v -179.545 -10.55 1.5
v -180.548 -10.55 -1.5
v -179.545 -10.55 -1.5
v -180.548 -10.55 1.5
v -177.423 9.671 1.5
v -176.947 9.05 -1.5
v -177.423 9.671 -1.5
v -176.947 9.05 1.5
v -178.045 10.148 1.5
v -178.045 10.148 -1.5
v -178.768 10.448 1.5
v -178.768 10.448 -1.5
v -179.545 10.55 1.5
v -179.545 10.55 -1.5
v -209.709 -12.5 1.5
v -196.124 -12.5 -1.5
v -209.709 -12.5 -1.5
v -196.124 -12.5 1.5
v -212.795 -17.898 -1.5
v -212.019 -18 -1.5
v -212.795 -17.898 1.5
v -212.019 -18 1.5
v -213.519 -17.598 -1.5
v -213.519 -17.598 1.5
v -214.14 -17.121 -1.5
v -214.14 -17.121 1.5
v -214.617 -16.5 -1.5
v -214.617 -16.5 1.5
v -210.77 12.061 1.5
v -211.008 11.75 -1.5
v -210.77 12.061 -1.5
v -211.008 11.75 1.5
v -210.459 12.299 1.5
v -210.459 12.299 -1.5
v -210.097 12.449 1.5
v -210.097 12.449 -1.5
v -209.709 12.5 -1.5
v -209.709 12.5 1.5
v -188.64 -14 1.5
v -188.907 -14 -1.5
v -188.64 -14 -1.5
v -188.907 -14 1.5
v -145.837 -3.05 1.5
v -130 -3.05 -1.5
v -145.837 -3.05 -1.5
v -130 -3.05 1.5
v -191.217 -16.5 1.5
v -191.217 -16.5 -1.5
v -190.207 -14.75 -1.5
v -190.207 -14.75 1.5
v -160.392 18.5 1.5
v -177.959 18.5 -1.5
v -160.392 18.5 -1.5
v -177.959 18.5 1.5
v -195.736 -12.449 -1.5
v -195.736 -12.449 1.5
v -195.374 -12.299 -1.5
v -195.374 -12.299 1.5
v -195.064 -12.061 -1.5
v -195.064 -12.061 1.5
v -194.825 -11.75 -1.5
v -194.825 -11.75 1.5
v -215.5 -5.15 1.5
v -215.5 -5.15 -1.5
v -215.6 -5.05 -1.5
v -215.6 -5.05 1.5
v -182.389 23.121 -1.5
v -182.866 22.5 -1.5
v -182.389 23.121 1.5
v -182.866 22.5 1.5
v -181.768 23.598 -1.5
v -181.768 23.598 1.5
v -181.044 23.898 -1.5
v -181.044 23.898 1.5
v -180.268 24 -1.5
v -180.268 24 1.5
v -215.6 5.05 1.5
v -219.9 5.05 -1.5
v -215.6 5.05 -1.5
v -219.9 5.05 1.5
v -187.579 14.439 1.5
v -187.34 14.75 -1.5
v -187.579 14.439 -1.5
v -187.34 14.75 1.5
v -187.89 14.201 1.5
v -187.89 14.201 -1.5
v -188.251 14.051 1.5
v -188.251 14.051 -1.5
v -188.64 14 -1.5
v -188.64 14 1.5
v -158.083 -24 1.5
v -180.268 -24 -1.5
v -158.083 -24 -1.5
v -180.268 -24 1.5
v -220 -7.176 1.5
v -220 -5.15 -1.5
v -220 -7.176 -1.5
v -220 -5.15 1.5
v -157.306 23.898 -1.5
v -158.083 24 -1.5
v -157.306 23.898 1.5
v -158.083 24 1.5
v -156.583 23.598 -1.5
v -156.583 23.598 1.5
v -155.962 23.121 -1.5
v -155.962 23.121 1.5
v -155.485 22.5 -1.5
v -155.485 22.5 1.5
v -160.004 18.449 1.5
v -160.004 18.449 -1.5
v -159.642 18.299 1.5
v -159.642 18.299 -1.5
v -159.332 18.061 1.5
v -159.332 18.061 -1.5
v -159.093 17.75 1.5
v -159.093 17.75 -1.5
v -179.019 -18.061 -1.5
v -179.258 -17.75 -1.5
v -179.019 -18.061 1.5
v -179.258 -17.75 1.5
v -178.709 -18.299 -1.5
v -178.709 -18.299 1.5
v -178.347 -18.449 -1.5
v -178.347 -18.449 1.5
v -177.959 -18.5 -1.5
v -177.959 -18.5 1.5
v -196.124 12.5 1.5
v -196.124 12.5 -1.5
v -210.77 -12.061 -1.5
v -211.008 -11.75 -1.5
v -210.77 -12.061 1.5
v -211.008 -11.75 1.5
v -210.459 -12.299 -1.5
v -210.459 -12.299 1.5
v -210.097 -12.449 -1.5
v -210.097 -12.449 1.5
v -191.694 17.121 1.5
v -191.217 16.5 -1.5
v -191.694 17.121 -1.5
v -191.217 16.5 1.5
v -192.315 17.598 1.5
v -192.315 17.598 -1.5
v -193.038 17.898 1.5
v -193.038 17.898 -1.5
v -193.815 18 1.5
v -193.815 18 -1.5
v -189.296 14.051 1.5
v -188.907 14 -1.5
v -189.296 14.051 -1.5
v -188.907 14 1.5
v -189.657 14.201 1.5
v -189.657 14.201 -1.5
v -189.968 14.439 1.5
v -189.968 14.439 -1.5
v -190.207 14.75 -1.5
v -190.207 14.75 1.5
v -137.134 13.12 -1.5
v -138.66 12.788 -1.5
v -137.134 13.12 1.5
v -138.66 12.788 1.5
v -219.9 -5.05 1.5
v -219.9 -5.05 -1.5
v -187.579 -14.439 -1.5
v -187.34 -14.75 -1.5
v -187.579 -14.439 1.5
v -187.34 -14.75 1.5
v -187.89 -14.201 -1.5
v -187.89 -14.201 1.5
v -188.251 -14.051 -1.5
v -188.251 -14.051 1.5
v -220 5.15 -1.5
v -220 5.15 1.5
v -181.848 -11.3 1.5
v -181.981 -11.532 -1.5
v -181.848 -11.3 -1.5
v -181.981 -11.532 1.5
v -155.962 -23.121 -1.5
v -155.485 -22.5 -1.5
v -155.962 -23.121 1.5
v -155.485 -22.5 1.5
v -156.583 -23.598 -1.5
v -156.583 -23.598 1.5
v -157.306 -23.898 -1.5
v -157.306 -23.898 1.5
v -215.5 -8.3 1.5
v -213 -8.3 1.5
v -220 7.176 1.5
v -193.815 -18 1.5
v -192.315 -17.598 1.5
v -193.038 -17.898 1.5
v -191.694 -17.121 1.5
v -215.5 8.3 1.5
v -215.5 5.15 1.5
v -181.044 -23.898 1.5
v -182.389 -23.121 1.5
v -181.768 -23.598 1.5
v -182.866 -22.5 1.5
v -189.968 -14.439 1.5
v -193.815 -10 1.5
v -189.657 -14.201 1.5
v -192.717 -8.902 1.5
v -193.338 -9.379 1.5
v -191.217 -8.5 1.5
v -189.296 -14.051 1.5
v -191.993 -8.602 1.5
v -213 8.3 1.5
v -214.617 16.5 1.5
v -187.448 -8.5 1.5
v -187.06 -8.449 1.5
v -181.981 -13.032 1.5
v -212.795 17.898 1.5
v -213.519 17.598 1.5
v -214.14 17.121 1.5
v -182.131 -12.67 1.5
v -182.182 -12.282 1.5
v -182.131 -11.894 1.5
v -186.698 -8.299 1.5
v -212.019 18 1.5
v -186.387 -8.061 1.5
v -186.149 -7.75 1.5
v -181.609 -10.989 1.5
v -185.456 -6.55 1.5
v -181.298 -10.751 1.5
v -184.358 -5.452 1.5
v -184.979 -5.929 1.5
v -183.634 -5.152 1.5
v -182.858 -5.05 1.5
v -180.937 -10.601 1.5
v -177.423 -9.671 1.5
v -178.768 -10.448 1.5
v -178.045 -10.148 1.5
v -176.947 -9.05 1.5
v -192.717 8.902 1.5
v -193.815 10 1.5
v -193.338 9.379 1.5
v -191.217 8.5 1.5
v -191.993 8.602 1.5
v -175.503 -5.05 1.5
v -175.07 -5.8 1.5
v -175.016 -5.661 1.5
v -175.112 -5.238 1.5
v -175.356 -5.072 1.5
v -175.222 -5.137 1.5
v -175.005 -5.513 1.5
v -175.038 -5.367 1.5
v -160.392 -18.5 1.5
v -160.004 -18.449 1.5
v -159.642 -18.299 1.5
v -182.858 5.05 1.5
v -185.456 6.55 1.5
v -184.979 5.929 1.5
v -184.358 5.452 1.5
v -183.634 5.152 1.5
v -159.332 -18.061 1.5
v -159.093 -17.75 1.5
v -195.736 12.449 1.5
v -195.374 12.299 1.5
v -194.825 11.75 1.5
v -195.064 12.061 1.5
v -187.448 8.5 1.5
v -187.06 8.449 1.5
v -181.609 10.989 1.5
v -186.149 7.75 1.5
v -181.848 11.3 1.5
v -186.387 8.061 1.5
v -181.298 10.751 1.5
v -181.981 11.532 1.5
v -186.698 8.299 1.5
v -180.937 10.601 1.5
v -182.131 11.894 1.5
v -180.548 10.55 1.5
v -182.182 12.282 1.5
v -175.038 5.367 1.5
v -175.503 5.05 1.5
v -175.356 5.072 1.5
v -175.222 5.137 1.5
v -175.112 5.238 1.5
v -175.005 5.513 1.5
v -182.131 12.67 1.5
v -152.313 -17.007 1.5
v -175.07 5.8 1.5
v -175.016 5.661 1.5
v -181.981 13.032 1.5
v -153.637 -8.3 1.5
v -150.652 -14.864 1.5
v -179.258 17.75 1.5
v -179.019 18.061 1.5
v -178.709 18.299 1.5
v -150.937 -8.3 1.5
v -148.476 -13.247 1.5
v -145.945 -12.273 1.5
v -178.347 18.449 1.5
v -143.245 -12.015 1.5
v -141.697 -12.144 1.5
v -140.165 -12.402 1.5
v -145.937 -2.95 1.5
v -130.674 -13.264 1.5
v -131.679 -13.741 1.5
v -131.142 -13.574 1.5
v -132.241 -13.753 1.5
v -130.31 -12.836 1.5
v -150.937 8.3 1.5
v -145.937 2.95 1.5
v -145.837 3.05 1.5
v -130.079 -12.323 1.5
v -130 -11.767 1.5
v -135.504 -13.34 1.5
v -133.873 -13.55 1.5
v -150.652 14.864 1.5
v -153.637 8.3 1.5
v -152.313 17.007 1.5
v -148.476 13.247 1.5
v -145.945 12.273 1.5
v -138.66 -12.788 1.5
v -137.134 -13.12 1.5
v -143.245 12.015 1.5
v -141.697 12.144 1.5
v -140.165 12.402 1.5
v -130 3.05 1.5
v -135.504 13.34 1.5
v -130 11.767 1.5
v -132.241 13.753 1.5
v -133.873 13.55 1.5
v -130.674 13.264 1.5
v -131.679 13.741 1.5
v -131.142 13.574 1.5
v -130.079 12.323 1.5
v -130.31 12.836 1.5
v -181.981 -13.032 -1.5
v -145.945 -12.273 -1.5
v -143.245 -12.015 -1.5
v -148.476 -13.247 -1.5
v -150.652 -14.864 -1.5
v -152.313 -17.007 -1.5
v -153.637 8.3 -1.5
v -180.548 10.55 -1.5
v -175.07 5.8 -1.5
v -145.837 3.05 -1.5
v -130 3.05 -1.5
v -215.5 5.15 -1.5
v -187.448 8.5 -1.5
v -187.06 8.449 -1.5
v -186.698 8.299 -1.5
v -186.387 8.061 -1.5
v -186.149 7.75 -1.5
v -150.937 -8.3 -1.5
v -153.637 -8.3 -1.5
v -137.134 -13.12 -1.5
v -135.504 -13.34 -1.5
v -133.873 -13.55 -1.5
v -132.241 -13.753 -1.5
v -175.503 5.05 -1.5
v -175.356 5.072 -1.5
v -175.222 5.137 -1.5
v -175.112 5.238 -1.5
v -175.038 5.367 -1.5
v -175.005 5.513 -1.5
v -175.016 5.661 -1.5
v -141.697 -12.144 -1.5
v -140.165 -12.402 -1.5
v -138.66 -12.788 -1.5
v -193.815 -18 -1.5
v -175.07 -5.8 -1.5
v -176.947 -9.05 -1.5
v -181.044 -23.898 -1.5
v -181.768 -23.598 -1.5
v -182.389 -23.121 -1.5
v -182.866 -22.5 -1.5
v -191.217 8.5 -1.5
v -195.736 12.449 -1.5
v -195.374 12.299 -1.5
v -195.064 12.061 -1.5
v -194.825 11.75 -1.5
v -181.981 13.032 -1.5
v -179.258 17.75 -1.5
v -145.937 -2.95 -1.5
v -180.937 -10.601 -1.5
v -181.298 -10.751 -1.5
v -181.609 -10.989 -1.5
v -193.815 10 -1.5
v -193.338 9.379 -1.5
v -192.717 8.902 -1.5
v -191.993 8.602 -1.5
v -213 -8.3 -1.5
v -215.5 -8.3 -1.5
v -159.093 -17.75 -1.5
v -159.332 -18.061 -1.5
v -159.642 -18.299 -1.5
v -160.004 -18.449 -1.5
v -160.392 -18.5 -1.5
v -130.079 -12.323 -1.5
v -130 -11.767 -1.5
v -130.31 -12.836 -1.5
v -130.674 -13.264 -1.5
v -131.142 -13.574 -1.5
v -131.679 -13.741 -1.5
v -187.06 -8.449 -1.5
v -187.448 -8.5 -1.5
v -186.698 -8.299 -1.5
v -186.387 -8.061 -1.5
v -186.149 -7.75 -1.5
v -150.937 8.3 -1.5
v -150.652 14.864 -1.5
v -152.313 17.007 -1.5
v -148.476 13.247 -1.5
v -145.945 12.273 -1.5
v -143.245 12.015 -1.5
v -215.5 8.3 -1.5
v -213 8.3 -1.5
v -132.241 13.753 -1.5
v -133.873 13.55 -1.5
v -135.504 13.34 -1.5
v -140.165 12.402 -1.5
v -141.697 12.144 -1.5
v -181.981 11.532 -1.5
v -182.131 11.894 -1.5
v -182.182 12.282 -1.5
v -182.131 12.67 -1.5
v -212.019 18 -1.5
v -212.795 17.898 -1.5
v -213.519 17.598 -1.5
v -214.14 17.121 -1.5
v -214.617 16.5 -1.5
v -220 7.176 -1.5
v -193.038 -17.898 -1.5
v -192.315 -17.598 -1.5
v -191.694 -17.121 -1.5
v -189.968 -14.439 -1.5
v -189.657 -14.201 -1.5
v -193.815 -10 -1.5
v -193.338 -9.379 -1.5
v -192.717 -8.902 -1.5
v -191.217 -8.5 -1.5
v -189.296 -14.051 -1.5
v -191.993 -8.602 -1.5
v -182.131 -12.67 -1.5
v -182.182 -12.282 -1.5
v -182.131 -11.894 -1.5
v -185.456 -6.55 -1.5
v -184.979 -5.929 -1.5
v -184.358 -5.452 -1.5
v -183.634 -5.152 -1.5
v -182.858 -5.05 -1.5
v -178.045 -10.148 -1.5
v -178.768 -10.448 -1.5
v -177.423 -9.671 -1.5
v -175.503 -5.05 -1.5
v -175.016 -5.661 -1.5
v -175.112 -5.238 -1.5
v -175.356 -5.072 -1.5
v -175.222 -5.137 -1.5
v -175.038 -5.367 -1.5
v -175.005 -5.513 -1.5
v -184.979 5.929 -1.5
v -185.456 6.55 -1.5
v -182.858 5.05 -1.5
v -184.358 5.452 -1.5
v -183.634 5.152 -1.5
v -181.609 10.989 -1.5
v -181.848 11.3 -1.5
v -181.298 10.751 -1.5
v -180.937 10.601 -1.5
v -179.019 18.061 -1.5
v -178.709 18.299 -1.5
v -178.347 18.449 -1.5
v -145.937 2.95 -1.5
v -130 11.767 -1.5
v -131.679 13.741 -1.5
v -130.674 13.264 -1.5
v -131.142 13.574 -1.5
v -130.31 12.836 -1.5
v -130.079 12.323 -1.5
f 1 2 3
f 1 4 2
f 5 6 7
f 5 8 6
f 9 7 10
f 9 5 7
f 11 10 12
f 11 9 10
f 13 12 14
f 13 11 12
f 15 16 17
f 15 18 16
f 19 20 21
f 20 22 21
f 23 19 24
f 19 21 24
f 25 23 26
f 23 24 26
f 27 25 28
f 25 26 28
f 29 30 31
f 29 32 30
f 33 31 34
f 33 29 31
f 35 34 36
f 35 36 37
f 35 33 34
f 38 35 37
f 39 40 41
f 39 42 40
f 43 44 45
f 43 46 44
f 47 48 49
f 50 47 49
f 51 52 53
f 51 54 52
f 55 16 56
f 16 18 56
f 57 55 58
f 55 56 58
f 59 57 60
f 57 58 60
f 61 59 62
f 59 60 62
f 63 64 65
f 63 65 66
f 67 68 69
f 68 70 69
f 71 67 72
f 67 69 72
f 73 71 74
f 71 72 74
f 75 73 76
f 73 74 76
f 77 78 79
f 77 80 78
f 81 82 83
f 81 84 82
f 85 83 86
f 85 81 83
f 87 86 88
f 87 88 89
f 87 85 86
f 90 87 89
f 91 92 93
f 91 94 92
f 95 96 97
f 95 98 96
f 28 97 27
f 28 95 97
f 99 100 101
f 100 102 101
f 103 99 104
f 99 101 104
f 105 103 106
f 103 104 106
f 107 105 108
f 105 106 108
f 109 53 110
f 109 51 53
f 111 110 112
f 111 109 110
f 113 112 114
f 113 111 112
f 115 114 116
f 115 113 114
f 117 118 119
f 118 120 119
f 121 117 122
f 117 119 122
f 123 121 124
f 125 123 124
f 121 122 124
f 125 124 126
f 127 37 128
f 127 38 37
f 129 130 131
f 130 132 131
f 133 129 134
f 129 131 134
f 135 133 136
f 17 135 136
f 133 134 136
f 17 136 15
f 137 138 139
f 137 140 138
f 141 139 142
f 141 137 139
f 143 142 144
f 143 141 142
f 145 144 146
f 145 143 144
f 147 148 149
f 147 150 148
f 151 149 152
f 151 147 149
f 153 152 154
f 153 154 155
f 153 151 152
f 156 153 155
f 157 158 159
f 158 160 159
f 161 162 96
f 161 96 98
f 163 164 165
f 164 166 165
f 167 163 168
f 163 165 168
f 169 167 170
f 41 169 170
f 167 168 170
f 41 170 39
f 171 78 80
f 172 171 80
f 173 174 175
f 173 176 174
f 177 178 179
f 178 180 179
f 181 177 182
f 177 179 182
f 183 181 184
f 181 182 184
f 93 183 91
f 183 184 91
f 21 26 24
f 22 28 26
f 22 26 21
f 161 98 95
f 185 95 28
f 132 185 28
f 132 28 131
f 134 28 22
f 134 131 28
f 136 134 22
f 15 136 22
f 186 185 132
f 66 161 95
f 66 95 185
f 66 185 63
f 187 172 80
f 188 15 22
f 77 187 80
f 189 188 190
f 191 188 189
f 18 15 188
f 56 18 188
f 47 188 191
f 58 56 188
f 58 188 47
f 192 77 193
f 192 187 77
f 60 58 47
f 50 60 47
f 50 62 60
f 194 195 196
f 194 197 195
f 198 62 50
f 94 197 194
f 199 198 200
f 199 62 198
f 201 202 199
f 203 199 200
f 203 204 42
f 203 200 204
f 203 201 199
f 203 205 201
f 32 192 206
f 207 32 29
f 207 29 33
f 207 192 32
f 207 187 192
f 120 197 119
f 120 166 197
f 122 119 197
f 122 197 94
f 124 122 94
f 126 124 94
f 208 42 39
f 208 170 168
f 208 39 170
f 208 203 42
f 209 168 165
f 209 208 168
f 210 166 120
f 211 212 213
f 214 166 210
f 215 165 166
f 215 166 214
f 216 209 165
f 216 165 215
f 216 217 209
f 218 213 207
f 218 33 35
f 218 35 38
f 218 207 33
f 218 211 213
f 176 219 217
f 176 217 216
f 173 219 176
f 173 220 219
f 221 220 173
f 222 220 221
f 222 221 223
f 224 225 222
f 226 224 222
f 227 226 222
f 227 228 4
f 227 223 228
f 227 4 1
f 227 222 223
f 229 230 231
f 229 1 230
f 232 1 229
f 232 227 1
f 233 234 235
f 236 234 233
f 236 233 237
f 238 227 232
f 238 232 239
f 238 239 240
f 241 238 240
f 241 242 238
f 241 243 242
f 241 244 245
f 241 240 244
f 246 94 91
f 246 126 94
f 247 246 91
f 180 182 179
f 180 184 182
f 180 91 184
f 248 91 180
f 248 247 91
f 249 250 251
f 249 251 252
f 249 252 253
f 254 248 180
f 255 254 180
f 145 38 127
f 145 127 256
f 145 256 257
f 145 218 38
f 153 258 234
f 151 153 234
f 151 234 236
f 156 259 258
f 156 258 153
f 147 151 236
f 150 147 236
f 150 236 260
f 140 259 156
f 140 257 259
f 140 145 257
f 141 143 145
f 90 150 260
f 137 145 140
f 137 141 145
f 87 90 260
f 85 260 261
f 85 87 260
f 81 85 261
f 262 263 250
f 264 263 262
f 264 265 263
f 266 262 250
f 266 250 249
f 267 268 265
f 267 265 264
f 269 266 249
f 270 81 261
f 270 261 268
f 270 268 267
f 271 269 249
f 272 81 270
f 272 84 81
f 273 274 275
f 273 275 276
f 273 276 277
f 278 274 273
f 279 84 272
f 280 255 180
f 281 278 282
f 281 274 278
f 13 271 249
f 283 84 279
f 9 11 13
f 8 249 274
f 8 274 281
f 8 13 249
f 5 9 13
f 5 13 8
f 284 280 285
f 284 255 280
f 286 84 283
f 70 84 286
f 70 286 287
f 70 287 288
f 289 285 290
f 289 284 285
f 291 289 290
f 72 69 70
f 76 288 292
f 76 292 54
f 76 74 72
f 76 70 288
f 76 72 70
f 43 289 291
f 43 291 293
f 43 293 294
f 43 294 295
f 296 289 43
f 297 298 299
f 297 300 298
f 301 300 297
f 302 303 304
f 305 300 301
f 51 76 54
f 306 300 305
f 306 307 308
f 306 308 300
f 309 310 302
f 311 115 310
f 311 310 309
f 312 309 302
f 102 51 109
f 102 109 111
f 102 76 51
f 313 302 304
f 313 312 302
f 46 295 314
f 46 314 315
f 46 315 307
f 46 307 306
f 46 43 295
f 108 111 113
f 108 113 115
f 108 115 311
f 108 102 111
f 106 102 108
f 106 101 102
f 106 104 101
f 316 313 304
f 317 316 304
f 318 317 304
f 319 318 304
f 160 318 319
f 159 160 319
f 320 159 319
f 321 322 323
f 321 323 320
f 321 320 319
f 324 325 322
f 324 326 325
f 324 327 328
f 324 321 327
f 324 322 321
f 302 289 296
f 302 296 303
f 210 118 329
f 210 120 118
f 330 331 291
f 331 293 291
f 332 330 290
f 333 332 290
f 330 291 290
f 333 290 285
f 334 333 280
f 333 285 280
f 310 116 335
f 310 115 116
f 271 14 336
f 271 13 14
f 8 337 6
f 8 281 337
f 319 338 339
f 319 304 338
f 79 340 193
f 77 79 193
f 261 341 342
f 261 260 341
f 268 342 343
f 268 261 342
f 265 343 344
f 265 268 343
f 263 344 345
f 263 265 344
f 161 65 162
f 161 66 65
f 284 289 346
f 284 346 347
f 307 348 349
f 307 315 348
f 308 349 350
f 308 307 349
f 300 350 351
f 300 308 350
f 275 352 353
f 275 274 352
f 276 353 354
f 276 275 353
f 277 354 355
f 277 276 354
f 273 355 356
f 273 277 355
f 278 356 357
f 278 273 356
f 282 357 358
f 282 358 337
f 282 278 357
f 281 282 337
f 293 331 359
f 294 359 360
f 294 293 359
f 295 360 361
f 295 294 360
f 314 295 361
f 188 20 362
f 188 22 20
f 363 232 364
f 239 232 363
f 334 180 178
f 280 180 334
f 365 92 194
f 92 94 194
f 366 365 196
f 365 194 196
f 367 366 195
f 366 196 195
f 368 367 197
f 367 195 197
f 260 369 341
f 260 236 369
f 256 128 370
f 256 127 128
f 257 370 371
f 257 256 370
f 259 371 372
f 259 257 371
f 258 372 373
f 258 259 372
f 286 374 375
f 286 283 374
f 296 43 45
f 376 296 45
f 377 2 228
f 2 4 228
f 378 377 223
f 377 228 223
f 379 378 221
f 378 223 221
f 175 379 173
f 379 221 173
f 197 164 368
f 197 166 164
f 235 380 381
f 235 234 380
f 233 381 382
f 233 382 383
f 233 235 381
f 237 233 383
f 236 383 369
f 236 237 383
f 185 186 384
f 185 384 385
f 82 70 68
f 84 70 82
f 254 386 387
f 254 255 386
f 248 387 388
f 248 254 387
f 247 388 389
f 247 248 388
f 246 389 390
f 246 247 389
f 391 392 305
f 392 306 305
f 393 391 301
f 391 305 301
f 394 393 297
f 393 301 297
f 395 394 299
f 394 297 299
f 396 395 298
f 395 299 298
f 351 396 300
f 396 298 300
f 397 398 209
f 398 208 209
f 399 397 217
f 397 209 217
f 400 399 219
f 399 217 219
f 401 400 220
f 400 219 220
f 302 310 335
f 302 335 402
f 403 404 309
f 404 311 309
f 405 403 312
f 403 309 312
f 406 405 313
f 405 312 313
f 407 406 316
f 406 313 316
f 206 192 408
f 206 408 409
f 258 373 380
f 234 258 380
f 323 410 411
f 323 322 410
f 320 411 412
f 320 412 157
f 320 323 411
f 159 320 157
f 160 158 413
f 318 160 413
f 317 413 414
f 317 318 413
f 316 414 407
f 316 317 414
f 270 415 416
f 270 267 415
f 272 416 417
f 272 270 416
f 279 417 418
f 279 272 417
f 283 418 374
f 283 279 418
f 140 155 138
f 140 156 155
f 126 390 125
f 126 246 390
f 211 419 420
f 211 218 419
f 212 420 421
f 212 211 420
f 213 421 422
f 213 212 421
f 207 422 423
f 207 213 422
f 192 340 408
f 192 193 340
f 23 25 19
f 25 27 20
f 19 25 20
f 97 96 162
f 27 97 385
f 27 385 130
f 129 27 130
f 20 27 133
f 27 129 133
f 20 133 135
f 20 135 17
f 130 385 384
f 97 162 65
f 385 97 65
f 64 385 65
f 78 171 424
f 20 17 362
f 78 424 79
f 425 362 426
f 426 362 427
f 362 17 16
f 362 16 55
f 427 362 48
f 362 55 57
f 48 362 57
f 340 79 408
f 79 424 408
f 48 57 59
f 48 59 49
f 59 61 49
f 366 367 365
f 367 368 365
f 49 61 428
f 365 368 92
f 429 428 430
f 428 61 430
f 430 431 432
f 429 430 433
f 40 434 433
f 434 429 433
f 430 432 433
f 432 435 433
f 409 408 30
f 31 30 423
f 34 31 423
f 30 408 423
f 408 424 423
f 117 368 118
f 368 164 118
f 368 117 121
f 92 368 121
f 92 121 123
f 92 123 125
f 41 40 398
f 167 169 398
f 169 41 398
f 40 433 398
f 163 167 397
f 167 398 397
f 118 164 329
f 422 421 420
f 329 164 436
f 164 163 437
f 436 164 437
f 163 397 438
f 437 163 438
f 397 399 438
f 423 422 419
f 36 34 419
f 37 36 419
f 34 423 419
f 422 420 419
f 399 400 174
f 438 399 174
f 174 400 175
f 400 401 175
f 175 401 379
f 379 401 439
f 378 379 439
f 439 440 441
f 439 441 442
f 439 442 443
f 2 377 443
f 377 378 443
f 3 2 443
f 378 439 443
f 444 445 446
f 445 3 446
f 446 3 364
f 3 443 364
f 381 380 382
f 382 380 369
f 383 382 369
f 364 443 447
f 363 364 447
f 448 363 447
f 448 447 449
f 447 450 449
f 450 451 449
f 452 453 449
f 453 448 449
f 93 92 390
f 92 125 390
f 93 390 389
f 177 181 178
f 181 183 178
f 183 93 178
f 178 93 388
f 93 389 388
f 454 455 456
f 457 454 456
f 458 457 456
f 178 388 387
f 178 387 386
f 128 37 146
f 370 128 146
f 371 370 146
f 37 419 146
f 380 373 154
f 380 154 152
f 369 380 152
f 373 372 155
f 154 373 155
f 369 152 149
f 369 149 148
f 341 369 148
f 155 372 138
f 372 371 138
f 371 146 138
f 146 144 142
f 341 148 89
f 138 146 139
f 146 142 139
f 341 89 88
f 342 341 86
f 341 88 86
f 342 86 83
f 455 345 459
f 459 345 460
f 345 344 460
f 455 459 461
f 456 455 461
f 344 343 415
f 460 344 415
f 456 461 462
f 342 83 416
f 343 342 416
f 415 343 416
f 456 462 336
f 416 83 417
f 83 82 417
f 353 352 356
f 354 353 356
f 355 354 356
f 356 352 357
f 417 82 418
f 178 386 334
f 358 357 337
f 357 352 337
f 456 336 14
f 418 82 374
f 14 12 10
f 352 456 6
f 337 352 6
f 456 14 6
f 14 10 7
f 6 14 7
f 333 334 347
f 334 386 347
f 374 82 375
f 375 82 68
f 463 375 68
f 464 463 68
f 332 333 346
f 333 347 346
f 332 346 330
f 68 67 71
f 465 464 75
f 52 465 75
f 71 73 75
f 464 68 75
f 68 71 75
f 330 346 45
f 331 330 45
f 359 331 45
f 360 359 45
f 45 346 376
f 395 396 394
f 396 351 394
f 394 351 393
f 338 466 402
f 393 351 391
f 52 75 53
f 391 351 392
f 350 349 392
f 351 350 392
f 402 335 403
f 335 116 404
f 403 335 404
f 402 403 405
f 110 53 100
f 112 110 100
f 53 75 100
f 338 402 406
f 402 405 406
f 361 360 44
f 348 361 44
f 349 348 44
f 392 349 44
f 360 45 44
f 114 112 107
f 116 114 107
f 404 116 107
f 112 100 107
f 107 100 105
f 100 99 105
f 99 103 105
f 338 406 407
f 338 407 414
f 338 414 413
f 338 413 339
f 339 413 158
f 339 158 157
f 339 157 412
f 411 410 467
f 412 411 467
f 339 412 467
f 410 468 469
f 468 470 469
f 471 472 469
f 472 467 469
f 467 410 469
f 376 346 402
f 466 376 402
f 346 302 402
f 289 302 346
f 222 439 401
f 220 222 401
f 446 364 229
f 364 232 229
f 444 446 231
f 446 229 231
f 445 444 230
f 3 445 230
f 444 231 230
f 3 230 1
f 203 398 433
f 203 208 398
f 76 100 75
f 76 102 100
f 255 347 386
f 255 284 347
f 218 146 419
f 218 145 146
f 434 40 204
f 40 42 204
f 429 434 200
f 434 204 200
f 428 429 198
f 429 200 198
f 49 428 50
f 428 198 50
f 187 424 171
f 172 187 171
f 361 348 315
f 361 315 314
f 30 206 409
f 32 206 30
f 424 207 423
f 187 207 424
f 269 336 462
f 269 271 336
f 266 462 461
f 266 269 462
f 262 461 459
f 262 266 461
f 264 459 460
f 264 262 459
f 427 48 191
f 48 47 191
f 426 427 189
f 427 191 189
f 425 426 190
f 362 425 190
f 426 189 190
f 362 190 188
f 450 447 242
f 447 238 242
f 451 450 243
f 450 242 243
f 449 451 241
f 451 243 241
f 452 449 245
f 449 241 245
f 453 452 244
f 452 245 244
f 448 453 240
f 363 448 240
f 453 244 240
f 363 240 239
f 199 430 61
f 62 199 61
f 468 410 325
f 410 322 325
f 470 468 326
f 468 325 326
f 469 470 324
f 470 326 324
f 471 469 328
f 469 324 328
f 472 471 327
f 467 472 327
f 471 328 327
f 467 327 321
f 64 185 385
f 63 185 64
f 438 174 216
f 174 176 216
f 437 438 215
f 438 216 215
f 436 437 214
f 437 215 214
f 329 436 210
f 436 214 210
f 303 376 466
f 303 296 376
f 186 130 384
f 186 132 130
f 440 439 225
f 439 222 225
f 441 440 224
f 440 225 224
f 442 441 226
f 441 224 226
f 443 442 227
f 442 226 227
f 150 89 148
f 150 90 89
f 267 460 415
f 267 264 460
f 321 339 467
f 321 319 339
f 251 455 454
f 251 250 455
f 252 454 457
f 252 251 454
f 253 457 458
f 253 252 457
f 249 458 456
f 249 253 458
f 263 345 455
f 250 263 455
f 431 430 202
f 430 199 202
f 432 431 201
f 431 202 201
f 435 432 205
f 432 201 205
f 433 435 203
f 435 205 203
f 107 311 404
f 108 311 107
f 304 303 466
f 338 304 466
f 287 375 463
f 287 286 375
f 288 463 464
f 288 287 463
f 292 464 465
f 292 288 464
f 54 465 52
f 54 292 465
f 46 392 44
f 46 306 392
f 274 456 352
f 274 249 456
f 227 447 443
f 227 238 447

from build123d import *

# Parameters (mm, degrees)
EXTRUDE_1_DEPTH = 1.5
FILLET_4_R      = 10
FILLET_7_R      = 1.5
FILLET_8_R      = 3
CHAMFER_1_SIZE  = 0.1
FILLET_9_R      = 2
FILLET_10_R     = 0.5


with BuildPart() as part:
    # 草图1 → 凸台-拉伸1 (new, symmetric)
    with BuildSketch(Plane.XY):
        with BuildLine():
            Line((-130, 3.05), (-130, 14.015709242))
            ThreePointArc((-130, 14.015709242), (-134.003306479, 13.533897344), (-138, 13))
            ThreePointArc((-138, 13), (-144, 12.000000001), (-150, 13))
            Line((-150, 13), (-156.350852961, 24))
            Line((-156.350852961, 24), (-182, 24))
            Line((-182, 24), (-187.773502692, 14))
            Line((-187.773502692, 14), (-189.773502692, 14))
            Line((-189.773502692, 14), (-192.082903768, 18))
            Line((-192.082903768, 18), (-213.75055535, 18))
            Line((-213.75055535, 18), (-220, 7.175644347))
            Line((-220, 7.175644347), (-220, 5.05))
            Line((-220, 5.05), (-215.5, 5.05))
            Line((-215.5, 5.05), (-215.5, 8.3))
            Line((-215.5, 8.3), (-213, 8.3))
            Line((-213, 8.3), (-210.575128869, 12.5))
            Line((-210.575128869, 12.5), (-195.258330249, 12.5))
            Line((-195.258330249, 12.5), (-192.948929172, 8.5))
            Line((-192.948929172, 8.5), (-186.581793069, 8.5))
            Line((-186.581793069, 8.5), (-184.58993464, 5.05))
            Line((-184.58993464, 5.05), (-174.637306696, 5.05))
            Line((-174.637306696, 5.05), (-177.812733177, 10.55))
            Line((-177.812733177, 10.55), (-181.41450816, 10.55))
            Line((-181.41450816, 10.55), (-182.41450816, 12.282050807))
            Line((-182.41450816, 12.282050807), (-178.824573519, 18.5))
            Line((-178.824573519, 18.5), (-159.526279442, 18.5))
            Line((-159.526279442, 18.5), (-153.637306696, 8.3))
            Line((-153.637306696, 8.3), (-150.937306696, 8.3))
            Line((-150.937306696, 8.3), (-150.937306696, 3.05))
            Line((-150.937306696, 3.05), (-150.937306696, -3.05))
            Line((-150.937306696, -3.05), (-150.937306696, -8.3))
            Line((-150.937306696, -8.3), (-153.637306696, -8.3))
            Line((-153.637306696, -8.3), (-159.526279442, -18.5))
            Line((-159.526279442, -18.5), (-178.824573519, -18.5))
            Line((-178.824573519, -18.5), (-182.41450816, -12.282050807))
            Line((-182.41450816, -12.282050807), (-181.41450816, -10.55))
            Line((-181.41450816, -10.55), (-177.812733177, -10.55))
            Line((-177.812733177, -10.55), (-174.637306696, -5.05))
            Line((-174.637306696, -5.05), (-184.58993464, -5.05))
            Line((-184.58993464, -5.05), (-186.581793069, -8.5))
            Line((-186.581793069, -8.5), (-192.948929172, -8.5))
            Line((-192.948929172, -8.5), (-195.258330249, -12.5))
            Line((-195.258330249, -12.5), (-210.575128869, -12.5))
            Line((-210.575128869, -12.5), (-213, -8.3))
            Line((-213, -8.3), (-215.5, -8.3))
            Line((-215.5, -8.3), (-215.5, -5.05))
            Line((-215.5, -5.05), (-220, -5.05))
            Line((-220, -5.05), (-220, -7.175644347))
            Line((-220, -7.175644347), (-213.75055535, -18))
            Line((-213.75055535, -18), (-192.082903768, -18))
            Line((-192.082903768, -18), (-189.773502692, -14))
            Line((-189.773502692, -14), (-187.773502692, -14))
            Line((-187.773502692, -14), (-182, -24))
            Line((-182, -24), (-156.350852961, -24))
            Line((-156.350852961, -24), (-150, -13))
            ThreePointArc((-150, -13), (-144, -12), (-138, -13))
            ThreePointArc((-138, -13), (-134.003306479, -13.533897343), (-130, -14.015709241))
            Line((-130, -14.015709242), (-130, -3.05))
            Line((-130, -3.05), (-145.937306696, -3.05))
            Line((-145.937306696, -3.05), (-145.937306696, 3.05))
            Line((-145.937306696, 3.05), (-130, 3.05))
        make_face()
    extrude(amount=EXTRUDE_1_DEPTH, both=True)

    # 圆角4
    fillet_4_edges = [part.edges().sort_by_distance(p)[0] for p in [
        (-138, 13, 0),
        (-138, -13, 0),
        (-150, -13, 0),
        (-150, 13, 0),
    ]]
    fillet(fillet_4_edges, radius=FILLET_4_R)

    # 圆角7
    fillet_7_edges = [part.edges().sort_by_distance(p)[0] for p in [
        (-187.773502692, -14, 0),
        (-189.773502692, -14, 0),
        (-210.575128869, -12.5, 0),
        (-195.258330249, -12.5, 0),
        (-186.581793069, -8.5, 0),
        (-181.41450816, -10.55, 0),
        (-182.41450816, -12.282050807, 0),
        (-178.824573519, -18.5, 0),
        (-159.526279442, -18.5, 0),
        (-159.526279442, 18.5, 0),
        (-178.824573519, 18.5, 0),
        (-182.41450816, 12.282050807, 0),
        (-181.41450816, 10.55, 0),
        (-186.581793069, 8.5, 0),
        (-195.258330249, 12.5, 0),
        (-210.575128869, 12.5, 0),
        (-189.773502692, 14, 0),
        (-187.773502692, 14, 0),
    ]]
    fillet(fillet_7_edges, radius=FILLET_7_R)

    # 圆角8
    fillet_8_edges = [part.edges().sort_by_distance(p)[0] for p in [
        (-156.350852961, -24, 0),
        (-182, -24, 0),
        (-192.082903768, -18, 0),
        (-213.75055535, -18, 0),
        (-192.948929172, -8.5, 0),
        (-184.58993464, -5.05, 0),
        (-177.812733177, -10.55, 0),
        (-177.812733177, 10.55, 0),
        (-184.58993464, 5.05, 0),
        (-192.948929172, 8.5, 0),
        (-213.75055535, 18, 0),
        (-192.082903768, 18, 0),
        (-182, 24, 0),
        (-156.350852961, 24, 0),
    ]]
    fillet(fillet_8_edges, radius=FILLET_8_R)

    # 倒角1
    chamfer_1_edges = [part.edges().sort_by_distance(p)[0] for p in [
        (-145.937306696, 3.05, 0),
        (-145.937306696, -3.05, 0),
        (-220, -5.05, 0),
        (-215.5, -5.05, 0),
        (-215.5, 5.05, 0),
        (-220, 5.05, 0),
    ]]
    chamfer(chamfer_1_edges, length=CHAMFER_1_SIZE)

    # 圆角9
    fillet_9_edges = [part.edges().sort_by_distance(p)[0] for p in [
        (-130, 14.015709242, 0),
        (-130, -14.015709241, 0),
    ]]
    fillet(fillet_9_edges, radius=FILLET_9_R)

    # 圆角10
    fillet_10_edges = [part.edges().sort_by_distance(p)[0] for p in [
        (-174.637306696, -5.05, 0),
        (-174.637306696, 5.05, 0),
    ]]
    fillet(fillet_10_edges, radius=FILLET_10_R)


solid = part.part
